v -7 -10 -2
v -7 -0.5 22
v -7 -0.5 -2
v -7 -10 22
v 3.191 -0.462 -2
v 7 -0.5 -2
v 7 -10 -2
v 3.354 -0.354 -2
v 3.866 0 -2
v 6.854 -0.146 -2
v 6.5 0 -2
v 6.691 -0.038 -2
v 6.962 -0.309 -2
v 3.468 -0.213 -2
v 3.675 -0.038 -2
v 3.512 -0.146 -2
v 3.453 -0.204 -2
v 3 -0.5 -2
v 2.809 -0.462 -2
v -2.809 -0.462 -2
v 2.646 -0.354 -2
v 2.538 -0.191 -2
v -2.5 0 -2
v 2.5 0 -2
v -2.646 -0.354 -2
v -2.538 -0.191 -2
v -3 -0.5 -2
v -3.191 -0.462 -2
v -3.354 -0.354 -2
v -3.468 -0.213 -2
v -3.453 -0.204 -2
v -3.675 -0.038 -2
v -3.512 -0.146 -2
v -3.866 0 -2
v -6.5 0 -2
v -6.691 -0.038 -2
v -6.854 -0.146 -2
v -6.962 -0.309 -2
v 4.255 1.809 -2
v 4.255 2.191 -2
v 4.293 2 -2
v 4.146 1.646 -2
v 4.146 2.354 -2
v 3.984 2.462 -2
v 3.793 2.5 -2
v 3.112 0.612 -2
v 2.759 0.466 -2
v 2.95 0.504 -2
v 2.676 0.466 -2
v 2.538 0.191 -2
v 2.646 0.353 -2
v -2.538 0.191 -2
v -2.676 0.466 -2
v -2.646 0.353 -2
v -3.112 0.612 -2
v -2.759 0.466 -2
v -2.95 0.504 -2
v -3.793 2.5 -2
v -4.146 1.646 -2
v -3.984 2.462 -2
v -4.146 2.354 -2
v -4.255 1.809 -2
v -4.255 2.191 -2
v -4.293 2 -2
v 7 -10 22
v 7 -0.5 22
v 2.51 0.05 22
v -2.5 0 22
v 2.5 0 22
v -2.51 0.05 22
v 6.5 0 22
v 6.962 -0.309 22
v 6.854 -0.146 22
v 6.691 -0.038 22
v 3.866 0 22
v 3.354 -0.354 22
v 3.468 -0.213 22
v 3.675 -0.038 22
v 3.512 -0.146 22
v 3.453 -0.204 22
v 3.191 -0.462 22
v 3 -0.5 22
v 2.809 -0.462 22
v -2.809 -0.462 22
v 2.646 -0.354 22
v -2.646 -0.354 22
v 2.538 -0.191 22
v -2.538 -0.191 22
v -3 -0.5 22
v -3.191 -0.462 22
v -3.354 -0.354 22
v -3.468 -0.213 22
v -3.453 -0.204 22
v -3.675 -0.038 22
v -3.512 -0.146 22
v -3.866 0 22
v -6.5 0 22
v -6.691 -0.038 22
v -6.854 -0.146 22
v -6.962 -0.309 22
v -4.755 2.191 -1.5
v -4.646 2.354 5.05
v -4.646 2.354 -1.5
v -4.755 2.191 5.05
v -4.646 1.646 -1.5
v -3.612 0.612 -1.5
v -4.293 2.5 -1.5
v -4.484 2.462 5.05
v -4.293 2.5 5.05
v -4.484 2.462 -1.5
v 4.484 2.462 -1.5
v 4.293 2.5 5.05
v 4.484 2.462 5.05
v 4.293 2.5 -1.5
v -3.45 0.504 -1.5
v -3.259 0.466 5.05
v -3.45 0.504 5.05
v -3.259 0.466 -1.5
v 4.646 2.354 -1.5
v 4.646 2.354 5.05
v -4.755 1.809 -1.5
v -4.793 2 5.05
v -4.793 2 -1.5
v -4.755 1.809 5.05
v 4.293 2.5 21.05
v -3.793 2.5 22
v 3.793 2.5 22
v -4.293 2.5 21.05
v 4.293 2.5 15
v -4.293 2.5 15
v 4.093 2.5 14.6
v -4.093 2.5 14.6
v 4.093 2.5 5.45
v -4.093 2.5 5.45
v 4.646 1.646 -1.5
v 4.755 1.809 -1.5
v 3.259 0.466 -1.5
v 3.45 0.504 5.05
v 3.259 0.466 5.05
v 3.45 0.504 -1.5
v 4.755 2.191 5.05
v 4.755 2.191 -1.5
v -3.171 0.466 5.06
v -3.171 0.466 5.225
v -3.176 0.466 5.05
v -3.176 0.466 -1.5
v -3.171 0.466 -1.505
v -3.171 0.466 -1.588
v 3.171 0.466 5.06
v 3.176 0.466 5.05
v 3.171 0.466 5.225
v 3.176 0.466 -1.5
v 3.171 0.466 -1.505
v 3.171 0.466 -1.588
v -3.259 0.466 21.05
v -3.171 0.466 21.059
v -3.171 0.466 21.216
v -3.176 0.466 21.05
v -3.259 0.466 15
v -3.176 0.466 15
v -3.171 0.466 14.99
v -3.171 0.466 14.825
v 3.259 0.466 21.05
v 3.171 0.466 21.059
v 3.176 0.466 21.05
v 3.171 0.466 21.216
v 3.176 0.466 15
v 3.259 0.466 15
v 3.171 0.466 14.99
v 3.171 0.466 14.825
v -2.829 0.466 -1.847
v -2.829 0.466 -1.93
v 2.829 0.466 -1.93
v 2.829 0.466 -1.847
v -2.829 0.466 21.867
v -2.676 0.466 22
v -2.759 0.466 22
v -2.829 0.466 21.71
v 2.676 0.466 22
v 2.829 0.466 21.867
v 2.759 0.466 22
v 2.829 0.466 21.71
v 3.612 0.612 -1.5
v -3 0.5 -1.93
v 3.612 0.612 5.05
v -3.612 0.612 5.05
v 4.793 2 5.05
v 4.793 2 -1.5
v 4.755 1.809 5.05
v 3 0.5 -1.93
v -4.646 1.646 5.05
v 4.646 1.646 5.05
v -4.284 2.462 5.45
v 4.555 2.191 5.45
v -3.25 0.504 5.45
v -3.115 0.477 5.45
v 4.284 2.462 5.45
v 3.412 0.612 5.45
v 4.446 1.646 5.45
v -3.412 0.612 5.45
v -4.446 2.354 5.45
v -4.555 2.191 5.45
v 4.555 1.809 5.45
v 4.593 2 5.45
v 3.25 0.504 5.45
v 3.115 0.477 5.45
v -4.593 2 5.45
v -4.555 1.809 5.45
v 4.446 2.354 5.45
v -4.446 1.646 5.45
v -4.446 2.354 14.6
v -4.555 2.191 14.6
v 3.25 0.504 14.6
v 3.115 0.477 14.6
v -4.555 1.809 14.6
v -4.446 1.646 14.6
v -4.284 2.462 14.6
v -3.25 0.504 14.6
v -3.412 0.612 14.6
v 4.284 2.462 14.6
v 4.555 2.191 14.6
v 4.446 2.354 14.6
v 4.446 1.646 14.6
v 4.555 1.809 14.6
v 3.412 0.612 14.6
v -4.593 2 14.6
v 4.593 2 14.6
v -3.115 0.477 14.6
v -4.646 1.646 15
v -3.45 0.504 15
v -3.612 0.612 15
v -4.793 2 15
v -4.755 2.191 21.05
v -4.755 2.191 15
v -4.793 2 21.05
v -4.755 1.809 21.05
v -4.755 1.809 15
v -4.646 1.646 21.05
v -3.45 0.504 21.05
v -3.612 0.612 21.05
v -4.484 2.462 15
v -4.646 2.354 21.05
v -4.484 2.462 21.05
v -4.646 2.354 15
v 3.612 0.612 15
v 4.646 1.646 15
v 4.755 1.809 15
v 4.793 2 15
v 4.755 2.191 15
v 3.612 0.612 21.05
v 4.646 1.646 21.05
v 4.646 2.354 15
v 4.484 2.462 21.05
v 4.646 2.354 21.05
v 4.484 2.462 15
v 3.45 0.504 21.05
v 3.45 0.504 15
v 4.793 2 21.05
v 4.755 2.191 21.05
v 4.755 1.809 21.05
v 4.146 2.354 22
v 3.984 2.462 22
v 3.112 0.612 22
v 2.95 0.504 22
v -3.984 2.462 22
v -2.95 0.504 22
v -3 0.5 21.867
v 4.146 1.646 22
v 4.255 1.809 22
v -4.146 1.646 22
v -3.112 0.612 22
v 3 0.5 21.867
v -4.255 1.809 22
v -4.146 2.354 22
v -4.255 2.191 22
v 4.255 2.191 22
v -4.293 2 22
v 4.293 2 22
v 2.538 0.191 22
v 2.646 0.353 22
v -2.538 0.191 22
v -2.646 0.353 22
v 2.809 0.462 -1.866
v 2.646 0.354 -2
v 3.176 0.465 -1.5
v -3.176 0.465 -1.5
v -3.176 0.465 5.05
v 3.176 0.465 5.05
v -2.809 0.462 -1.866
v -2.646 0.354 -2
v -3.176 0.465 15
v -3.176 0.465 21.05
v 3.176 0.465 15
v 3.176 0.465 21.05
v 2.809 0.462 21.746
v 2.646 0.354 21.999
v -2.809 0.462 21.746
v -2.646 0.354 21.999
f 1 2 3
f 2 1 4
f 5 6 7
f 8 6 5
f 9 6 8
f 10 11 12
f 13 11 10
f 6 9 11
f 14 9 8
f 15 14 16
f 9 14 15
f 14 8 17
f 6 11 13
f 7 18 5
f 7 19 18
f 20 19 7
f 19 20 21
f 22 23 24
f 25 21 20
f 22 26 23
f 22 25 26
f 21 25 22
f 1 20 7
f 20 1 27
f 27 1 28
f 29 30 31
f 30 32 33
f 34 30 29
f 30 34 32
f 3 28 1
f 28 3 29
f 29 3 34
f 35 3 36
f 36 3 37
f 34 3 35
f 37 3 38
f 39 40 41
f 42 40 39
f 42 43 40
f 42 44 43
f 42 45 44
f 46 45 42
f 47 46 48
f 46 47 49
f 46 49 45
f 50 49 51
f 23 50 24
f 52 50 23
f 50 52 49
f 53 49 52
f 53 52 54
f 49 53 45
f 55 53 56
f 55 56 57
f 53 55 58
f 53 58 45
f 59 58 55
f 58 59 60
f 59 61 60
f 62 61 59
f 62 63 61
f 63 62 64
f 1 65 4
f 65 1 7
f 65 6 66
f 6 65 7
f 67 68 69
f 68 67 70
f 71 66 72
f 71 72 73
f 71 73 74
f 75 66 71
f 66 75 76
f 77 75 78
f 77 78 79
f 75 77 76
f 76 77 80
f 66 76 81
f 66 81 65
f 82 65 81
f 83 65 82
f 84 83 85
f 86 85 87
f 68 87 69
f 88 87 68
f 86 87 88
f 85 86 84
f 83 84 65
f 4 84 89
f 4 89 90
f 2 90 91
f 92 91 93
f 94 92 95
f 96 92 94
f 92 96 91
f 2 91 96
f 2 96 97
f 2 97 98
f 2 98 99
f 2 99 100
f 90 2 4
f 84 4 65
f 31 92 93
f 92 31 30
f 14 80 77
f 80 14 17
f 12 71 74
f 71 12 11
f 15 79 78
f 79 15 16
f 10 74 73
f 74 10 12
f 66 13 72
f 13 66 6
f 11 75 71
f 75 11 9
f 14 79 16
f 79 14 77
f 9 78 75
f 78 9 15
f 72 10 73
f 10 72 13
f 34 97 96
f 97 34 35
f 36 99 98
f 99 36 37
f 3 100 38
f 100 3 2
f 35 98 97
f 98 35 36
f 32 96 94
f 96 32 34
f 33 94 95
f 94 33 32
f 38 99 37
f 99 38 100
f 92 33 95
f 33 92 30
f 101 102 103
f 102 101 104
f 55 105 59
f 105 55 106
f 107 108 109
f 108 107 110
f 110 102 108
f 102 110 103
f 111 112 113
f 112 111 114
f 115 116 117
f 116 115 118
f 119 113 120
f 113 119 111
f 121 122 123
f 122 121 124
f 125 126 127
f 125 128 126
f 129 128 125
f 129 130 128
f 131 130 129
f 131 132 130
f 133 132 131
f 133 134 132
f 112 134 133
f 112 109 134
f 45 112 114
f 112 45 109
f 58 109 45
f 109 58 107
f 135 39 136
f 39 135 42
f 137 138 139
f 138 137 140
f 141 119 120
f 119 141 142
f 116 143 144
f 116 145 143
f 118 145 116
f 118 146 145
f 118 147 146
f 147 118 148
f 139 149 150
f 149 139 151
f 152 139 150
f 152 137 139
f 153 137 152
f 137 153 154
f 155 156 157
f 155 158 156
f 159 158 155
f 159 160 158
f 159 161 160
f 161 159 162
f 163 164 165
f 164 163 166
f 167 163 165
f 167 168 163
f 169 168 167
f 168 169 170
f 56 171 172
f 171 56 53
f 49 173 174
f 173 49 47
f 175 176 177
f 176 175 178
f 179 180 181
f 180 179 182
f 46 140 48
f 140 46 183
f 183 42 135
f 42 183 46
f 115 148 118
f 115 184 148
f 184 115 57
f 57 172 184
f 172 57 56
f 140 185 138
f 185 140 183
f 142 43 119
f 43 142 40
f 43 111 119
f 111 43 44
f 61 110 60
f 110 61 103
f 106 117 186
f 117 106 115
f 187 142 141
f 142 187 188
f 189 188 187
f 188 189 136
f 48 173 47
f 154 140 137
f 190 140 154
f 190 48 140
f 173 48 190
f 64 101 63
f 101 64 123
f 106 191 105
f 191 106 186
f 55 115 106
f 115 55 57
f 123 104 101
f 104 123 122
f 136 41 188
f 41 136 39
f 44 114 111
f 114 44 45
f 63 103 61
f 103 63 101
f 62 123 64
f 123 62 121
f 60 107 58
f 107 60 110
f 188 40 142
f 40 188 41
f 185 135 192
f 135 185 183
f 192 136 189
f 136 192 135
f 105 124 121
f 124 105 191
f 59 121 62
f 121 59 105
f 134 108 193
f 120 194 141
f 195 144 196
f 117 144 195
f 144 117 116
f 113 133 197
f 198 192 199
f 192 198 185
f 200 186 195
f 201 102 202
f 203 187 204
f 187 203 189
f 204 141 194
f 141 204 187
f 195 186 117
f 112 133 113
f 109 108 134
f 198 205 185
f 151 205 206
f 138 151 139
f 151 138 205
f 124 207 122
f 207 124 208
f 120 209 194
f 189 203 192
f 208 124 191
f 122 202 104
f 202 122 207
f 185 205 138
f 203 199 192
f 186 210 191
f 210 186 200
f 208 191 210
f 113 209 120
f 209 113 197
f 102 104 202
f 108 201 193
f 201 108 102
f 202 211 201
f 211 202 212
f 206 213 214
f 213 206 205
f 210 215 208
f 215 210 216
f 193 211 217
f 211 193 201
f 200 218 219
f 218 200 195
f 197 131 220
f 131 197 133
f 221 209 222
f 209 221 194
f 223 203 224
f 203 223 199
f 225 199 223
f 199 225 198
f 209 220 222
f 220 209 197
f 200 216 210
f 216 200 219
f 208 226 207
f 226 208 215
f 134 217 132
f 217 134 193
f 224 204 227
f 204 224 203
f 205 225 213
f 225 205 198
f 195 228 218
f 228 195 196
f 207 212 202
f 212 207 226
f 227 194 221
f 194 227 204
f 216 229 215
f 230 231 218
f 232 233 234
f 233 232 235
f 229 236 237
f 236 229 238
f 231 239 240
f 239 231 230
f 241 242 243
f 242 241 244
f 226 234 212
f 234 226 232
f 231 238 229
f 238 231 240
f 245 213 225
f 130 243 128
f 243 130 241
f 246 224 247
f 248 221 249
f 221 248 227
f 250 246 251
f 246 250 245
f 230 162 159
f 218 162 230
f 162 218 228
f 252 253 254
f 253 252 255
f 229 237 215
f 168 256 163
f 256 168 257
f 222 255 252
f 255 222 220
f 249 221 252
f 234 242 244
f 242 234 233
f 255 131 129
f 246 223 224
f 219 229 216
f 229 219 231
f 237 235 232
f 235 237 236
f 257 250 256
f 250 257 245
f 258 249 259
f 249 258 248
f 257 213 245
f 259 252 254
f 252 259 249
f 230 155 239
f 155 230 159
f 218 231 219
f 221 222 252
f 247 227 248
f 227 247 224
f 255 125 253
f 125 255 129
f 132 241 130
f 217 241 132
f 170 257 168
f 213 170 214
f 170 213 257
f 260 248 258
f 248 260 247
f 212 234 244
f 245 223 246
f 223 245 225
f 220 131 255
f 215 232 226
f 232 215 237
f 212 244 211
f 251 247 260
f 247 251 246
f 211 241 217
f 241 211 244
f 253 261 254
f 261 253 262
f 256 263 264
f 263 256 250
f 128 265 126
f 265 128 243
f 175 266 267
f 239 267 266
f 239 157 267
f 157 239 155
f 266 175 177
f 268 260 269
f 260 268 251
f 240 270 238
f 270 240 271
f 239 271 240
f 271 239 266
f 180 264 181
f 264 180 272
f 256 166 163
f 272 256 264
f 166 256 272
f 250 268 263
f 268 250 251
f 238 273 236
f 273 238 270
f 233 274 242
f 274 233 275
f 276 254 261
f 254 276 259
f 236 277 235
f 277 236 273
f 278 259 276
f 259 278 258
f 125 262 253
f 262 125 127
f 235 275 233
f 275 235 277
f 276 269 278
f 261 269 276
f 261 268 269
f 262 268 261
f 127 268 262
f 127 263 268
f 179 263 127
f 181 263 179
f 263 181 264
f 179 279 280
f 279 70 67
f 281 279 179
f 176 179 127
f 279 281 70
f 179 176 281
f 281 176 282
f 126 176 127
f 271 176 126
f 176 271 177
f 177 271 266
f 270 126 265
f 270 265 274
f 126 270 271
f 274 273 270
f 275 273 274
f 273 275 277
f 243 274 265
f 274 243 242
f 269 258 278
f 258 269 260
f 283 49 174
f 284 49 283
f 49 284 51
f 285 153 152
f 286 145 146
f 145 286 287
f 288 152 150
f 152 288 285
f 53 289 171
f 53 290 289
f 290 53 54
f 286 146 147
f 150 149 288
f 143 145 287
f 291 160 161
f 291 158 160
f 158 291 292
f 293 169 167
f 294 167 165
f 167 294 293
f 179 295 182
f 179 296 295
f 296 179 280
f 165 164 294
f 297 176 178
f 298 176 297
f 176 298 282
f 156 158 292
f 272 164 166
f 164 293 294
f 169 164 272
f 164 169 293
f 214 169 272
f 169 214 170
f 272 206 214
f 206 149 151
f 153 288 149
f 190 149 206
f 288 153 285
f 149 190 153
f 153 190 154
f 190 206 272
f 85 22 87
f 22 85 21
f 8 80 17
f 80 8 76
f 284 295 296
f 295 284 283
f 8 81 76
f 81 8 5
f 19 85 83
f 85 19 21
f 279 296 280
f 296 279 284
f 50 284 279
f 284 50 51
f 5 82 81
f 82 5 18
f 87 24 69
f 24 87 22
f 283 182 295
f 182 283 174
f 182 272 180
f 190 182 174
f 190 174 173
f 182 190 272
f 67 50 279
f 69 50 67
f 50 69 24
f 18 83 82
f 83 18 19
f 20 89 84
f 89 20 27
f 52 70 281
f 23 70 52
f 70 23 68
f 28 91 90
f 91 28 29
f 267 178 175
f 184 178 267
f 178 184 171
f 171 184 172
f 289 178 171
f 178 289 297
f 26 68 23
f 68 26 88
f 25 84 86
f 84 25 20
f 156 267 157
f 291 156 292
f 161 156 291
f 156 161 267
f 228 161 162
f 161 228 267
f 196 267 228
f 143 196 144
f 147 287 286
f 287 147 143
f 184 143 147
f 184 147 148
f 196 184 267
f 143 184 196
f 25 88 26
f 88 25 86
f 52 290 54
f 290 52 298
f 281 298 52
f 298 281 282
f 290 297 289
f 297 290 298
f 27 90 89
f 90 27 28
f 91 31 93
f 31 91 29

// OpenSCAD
/******************************************************************
*                                                                 *
* OpenFlexure Microscope: Dovetail                                *
*                                                                 *
* This is part of the OpenFlexure microscope, an open-source      *
* microscope and 3-axis translation stage.  It gets really good   *
* precision over a ~10mm range, by using plastic flexure          *
* mechanisms.                                                     *
*                                                                 *
* This file deals with the dovetail clips that are used to hold   *
* the objective and illumination, and provide coarse Z adjustment.*
*                                                                 *
* (c) Richard Bowman, January 2016                                *
* Released under the CERN Open Hardware License                   *
*                                                                 *
******************************************************************/

use <utilities.scad>;
$fn=16;
d=0.05;

module dovetail_clip_cutout(size,dt=1.5,t=2,slope_front=0,solid_bottom=0){
    // This will form a female dovetail when subtracted from a block.
    // cut this out of a cube (of size "size", with one edge centred along
    // the X axis extending into +y, +z
    //
    // dt sets the size of the 45-degree clips
    // t sets the thickness of the dovetail arms (2mm is good)
    // slope_front cuts off the bottom of the ends of the arms, i.e.
    //   the part that does the gripping starts above Z=0.  This can
    //   avoid the splodginess that comes from the bottom few layers,
    //   and make it print much better - useful if you want to insert
    //   things from the bottom.
    // solid_bottom joins the bottoms of the arms with a thin layer.
    //   this can help it stick to the print bed.
    //
    // I reccommend using ~8-10mm arms for a tight fit.  On all my
    // printers, the ooze of the plastic is enough to keep it tight, so I
    // set the size of the M and F dovetails to be identical.  You might
    // want to make it tighter, either by increasing dt slightly or by
    // decreasing the size slightly (in both cases, of this, the female
    // dovetail).
    // NB that it starts at z=-d and stops at z=size.z+d to make
    // it easy to subtract from a block.
    
    cutout_bottom = solid_bottom > 0 ? solid_bottom+d : -d;
    inner_w = size.x - 2*t; // width between arms
    
    hull() reflect([1,0,0]) translate([-size.x/2+t,0,cutout_bottom]){
        translate([dt,size.y-dt,0]) cylinder(r=dt,h=size.z+2*d,$fn=16);
        translate([0,dt,0]) rotate(-45) cube([dt*2,d,size.z+2*d]);
    }
    
    if(slope_front>0){
        //sloped bottom to improve quality of the dovetail clip and
        //allow insertion of the male dovetail from the bottom
        rotate([45,0,0]) cube([999,1,1]*sqrt(2)*slope_front,center=true); //slope up arms
        //also, slope in the dovetail tooth to avoid marring at the bottom:
        hull() reflect([0,0,1]) translate([0,0,slope_front]) 
            rotate([0,45,0]) cube([(inner_w)/sqrt(2),dt*2,inner_w/sqrt(2)],center=true);
    }
}
module dovetail_clip(size=[10,2,10],dt=1.5,t=2,back_t=0,slope_front=0,solid_bottom=0){
    // This forms a clip that will grip a dovetail, with the
    // contact between the m/f parts in the y=0 plane.
    // This is the female part, and it is centred in X and 
    // extends into +y, +z.
    // The outer dimensions of the clip are given by size.
    // dt sets the size of the clip's teeth, and t is the
    // thickness of the arms.  By default it has no back, and
    // should be attached to a solid surface.  Specifying back_t>0
    // will add material at the back (by shortening the arms).
    // slope_front will add a sloped section to the front of the arms.
    // this can improve the quality of the bottom of the dovetail 
    // (good if you're inserting from the bottom)
    // solid_bottom will join the arms together at the bottom, which
    // can help with bed adhesion.
    // see dovetail_clip_cutout - most of the options are just passed through.
	difference(){
		translate([-size.x/2,0,0]) cube(size);
		dovetail_clip_cutout(size-[0,back_t+d,0],dt=dt,t=t,slope_front=slope_front,solid_bottom=solid_bottom);
	}
}

module dovetail_plug(corner_x, r, dt, zx_profile=[[0,0],[10,0],[12,-1]]){
    // Just the "plug" of a male dovetail (i.e. not the flat surface
    // it's attached to, just the bit that fits inside the female).
    // zx_profile is a list of 2-element vectors, each of which defines
    //   a point in Z-X space, i.e. first element is height and second
    //   is the shift in the corner position.  For example,
    //   zx_profile=[[0,0],[10,0],[12,-1]] creates a plug 12mm+d high 
    //   where the top 2mm are sloped at 60 degrees.  NB the use of d.
    union(){
        // sorry for the copy-paste code; I'm fairly sure it's less readable
        // if I arrange things in a way that avoids it...
        // four fat cylinders make the contact point
        for(i=[0:len(zx_profile)-2]){
            hull() for(j=[0:1]){
                z = zx_profile[i+j][0];
                x = zx_profile[i+j][1];
                reflect([1,0,0]) translate([corner_x+x,0,z]) rotate(45) translate([sqrt(3)*r,r,0]) repeat([dt*sqrt(2) - (1+sqrt(3))*r,0,0],2) cylinder(r=r,h=d);
            }
        }
        // another four cylinders join the plug to the y=0 plane
        for(i=[0:len(zx_profile)-2]){
            hull() for(j=[0:1]){
                z = zx_profile[i+j][0];
                x = zx_profile[i+j][1];
                reflect([1,0,0]) translate([corner_x+x,0,z]) rotate(45) repeat([sqrt(3)*r,r,0],2) cylinder(r=d,h=d);
            }
        }
    }
}
module dovetail_m(size=[10,2,10],dt=1.5,t=2,top_taper=1,bottom_taper=0.5,waist=0,waist_dx=0.5,r=0.5){
    // Male dovetail, contact plane is y=0, dovetail is in y>0
    // size is a box that is centred in X, sits on Z=0, and extends
    // in the -y direction from y=0.  This is the mount for the
    // dovetail, which sits in the +y direction.
    // The width of the box should be the same as the width of the
    // female dovetail clip.  The size of the dovetail is set by dt.
    // t sets the thickness of the female dovetail arms; the dovetail
    // is actually size.x-2*t wide.
    r=r; //radius of curvature - something around nozzle width is good.
    w=size.x-2*t; //width of dovetail
    h=size.z; //height
    corner=[w/2-dt,0,0]; //location of the pointy bit of the dovetail
    difference(){
		union(){
            //back of the dovetail (the mount) plus the start of the
            //dovetail's neck (as far as y=0)
			sequential_hull(){
                // start with the cube that the dovetail attaches to
				translate([-w/2-t,-size.y,0]) cube([w+2*t,size.y-r,h]);
                // then add shapes that take in the centres of the cylinders
                // from the next step.  This joins together the nicely-rounded
                // contact points, such that when we subtract out the cylinders
                // at the corners we get a nice smooth shape.
                reflect([1,0,0]) translate(corner+[sqrt(3)*r,-r,0]) cylinder(r=d,h=h);
                reflect([1,0,0]) translate(corner) cylinder(r=d,h=h);
			}
            //contact points (with rounded edges to avoid burrs)
			difference(){
				union(){
					reflect([1,0,0]) hull(){
						translate(corner+[sqrt(3)*r,-r,0]) cylinder(r=r,h=h);	
						translate([w/2+t-r,-r,0]) cylinder(r=r,h=h);	
                    }
					//hull() reflect([1,0,0]) translate(corner) rotate(45) translate([sqrt(3)*r,r,0]) repeat([1,0,0],2) cylinder(r=r,h=h);
                    // the "plug" is tapered for easy insertion, and may
                    // have optional indents in the middle (a "waist").
                    waist_dx = waist>waist_dx*4 ? waist_dx : 0;
                    waist_dz = waist>waist_dx*4 ? waist_dx*2 : d;
                    zx_profile = [[0,-bottom_taper],
                                  [bottom_taper,0],
                                  [h/2-waist/2,0],
                                  [h/2-waist/2+waist_dz,-waist_dx],
                                  [h/2+waist/2-waist_dz,-waist_dx],
                                  [h/2+waist/2,0],
                                  [h-top_taper,0],
                                  [h-d,-top_taper/2]];
                    dovetail_plug(corner.x, r, dt, zx_profile);
                        
				}
			}
		}
        // We round out the internal corner so that we grip with the edges
        // of the tooth and not the point (you get better contact this way).
		reflect([1,0,0]) translate(corner) cylinder(r=r,h=3*h,center=true);
	}
}

module dovetail_clip_y(size, dt=1.5, t=2, taper=0, endstop=false){
    // Make a dovetail where the sliding axis is along y, i.e. horizontal
    // This means it's the top of the object that grips the dovetail.
    //
    // the x and y elements of size set the dovetail width and "height"
    // the z element sets the distance from the end of the teeth (z=0) to
    // the bottom of the mount.
    // dt is the size of the dovetail teeth
    // endstop enables a link on the other side of the Y axis, to stop motion there.
    // endstop_w, endstop_t set the width and thickness (in y and z) of the link
    // taper optionally feathers the dovetail onto an edge
    // the dovetail extends along the +y direction from y=0
    h = size.y;
    ew = 0;//endstop ? endstop_w : 0;
    reflect([1,0,0]) translate([-size.x/2,0,0]) mirror([0,0,1]) sequential_hull(){
        translate([0,dt,0]) cube([t+dt,h-2*dt,d]);
        cube([t,h,dt]);
        translate([0,-ew,0]) cube([t,h+ew,dt]);
        translate([0,-taper,size.z-d]) cube([t,h+2*taper,d]);
    }
    if(endstop){
        difference(){
            hull(){ // make a bridge between the lower tapers
                translate([0,-taper/2,-size.z+d]) cube([size.x,taper,2*d],center=true);
                translate([0,0,-d]) cube([size.x,d,2*d],center=true);
            }
            translate([0,0,-size.z+0.5+999/2]) cube([(size.x-2*t-2*dt)-2,999,999],center=true); //cut the middle
            translate([0,-taper/2,-size.z]) cube([size.x,taper-1.5,0.5*2+d],center=true);
        }
    }
}
//dovetail_clip_y([12,12,3],taper=2,endstop=true);
///
test_size = [14,10,24];
test_dt = 2;
//color("blue") dovetail_clip(test_size,dt=test_dt,slope_front=3,solid_bottom=0.5);
color("green") translate([0,0,-2]) dovetail_m(test_size, waist=10, dt=test_dt,waist_dx=0.2);
//*/
